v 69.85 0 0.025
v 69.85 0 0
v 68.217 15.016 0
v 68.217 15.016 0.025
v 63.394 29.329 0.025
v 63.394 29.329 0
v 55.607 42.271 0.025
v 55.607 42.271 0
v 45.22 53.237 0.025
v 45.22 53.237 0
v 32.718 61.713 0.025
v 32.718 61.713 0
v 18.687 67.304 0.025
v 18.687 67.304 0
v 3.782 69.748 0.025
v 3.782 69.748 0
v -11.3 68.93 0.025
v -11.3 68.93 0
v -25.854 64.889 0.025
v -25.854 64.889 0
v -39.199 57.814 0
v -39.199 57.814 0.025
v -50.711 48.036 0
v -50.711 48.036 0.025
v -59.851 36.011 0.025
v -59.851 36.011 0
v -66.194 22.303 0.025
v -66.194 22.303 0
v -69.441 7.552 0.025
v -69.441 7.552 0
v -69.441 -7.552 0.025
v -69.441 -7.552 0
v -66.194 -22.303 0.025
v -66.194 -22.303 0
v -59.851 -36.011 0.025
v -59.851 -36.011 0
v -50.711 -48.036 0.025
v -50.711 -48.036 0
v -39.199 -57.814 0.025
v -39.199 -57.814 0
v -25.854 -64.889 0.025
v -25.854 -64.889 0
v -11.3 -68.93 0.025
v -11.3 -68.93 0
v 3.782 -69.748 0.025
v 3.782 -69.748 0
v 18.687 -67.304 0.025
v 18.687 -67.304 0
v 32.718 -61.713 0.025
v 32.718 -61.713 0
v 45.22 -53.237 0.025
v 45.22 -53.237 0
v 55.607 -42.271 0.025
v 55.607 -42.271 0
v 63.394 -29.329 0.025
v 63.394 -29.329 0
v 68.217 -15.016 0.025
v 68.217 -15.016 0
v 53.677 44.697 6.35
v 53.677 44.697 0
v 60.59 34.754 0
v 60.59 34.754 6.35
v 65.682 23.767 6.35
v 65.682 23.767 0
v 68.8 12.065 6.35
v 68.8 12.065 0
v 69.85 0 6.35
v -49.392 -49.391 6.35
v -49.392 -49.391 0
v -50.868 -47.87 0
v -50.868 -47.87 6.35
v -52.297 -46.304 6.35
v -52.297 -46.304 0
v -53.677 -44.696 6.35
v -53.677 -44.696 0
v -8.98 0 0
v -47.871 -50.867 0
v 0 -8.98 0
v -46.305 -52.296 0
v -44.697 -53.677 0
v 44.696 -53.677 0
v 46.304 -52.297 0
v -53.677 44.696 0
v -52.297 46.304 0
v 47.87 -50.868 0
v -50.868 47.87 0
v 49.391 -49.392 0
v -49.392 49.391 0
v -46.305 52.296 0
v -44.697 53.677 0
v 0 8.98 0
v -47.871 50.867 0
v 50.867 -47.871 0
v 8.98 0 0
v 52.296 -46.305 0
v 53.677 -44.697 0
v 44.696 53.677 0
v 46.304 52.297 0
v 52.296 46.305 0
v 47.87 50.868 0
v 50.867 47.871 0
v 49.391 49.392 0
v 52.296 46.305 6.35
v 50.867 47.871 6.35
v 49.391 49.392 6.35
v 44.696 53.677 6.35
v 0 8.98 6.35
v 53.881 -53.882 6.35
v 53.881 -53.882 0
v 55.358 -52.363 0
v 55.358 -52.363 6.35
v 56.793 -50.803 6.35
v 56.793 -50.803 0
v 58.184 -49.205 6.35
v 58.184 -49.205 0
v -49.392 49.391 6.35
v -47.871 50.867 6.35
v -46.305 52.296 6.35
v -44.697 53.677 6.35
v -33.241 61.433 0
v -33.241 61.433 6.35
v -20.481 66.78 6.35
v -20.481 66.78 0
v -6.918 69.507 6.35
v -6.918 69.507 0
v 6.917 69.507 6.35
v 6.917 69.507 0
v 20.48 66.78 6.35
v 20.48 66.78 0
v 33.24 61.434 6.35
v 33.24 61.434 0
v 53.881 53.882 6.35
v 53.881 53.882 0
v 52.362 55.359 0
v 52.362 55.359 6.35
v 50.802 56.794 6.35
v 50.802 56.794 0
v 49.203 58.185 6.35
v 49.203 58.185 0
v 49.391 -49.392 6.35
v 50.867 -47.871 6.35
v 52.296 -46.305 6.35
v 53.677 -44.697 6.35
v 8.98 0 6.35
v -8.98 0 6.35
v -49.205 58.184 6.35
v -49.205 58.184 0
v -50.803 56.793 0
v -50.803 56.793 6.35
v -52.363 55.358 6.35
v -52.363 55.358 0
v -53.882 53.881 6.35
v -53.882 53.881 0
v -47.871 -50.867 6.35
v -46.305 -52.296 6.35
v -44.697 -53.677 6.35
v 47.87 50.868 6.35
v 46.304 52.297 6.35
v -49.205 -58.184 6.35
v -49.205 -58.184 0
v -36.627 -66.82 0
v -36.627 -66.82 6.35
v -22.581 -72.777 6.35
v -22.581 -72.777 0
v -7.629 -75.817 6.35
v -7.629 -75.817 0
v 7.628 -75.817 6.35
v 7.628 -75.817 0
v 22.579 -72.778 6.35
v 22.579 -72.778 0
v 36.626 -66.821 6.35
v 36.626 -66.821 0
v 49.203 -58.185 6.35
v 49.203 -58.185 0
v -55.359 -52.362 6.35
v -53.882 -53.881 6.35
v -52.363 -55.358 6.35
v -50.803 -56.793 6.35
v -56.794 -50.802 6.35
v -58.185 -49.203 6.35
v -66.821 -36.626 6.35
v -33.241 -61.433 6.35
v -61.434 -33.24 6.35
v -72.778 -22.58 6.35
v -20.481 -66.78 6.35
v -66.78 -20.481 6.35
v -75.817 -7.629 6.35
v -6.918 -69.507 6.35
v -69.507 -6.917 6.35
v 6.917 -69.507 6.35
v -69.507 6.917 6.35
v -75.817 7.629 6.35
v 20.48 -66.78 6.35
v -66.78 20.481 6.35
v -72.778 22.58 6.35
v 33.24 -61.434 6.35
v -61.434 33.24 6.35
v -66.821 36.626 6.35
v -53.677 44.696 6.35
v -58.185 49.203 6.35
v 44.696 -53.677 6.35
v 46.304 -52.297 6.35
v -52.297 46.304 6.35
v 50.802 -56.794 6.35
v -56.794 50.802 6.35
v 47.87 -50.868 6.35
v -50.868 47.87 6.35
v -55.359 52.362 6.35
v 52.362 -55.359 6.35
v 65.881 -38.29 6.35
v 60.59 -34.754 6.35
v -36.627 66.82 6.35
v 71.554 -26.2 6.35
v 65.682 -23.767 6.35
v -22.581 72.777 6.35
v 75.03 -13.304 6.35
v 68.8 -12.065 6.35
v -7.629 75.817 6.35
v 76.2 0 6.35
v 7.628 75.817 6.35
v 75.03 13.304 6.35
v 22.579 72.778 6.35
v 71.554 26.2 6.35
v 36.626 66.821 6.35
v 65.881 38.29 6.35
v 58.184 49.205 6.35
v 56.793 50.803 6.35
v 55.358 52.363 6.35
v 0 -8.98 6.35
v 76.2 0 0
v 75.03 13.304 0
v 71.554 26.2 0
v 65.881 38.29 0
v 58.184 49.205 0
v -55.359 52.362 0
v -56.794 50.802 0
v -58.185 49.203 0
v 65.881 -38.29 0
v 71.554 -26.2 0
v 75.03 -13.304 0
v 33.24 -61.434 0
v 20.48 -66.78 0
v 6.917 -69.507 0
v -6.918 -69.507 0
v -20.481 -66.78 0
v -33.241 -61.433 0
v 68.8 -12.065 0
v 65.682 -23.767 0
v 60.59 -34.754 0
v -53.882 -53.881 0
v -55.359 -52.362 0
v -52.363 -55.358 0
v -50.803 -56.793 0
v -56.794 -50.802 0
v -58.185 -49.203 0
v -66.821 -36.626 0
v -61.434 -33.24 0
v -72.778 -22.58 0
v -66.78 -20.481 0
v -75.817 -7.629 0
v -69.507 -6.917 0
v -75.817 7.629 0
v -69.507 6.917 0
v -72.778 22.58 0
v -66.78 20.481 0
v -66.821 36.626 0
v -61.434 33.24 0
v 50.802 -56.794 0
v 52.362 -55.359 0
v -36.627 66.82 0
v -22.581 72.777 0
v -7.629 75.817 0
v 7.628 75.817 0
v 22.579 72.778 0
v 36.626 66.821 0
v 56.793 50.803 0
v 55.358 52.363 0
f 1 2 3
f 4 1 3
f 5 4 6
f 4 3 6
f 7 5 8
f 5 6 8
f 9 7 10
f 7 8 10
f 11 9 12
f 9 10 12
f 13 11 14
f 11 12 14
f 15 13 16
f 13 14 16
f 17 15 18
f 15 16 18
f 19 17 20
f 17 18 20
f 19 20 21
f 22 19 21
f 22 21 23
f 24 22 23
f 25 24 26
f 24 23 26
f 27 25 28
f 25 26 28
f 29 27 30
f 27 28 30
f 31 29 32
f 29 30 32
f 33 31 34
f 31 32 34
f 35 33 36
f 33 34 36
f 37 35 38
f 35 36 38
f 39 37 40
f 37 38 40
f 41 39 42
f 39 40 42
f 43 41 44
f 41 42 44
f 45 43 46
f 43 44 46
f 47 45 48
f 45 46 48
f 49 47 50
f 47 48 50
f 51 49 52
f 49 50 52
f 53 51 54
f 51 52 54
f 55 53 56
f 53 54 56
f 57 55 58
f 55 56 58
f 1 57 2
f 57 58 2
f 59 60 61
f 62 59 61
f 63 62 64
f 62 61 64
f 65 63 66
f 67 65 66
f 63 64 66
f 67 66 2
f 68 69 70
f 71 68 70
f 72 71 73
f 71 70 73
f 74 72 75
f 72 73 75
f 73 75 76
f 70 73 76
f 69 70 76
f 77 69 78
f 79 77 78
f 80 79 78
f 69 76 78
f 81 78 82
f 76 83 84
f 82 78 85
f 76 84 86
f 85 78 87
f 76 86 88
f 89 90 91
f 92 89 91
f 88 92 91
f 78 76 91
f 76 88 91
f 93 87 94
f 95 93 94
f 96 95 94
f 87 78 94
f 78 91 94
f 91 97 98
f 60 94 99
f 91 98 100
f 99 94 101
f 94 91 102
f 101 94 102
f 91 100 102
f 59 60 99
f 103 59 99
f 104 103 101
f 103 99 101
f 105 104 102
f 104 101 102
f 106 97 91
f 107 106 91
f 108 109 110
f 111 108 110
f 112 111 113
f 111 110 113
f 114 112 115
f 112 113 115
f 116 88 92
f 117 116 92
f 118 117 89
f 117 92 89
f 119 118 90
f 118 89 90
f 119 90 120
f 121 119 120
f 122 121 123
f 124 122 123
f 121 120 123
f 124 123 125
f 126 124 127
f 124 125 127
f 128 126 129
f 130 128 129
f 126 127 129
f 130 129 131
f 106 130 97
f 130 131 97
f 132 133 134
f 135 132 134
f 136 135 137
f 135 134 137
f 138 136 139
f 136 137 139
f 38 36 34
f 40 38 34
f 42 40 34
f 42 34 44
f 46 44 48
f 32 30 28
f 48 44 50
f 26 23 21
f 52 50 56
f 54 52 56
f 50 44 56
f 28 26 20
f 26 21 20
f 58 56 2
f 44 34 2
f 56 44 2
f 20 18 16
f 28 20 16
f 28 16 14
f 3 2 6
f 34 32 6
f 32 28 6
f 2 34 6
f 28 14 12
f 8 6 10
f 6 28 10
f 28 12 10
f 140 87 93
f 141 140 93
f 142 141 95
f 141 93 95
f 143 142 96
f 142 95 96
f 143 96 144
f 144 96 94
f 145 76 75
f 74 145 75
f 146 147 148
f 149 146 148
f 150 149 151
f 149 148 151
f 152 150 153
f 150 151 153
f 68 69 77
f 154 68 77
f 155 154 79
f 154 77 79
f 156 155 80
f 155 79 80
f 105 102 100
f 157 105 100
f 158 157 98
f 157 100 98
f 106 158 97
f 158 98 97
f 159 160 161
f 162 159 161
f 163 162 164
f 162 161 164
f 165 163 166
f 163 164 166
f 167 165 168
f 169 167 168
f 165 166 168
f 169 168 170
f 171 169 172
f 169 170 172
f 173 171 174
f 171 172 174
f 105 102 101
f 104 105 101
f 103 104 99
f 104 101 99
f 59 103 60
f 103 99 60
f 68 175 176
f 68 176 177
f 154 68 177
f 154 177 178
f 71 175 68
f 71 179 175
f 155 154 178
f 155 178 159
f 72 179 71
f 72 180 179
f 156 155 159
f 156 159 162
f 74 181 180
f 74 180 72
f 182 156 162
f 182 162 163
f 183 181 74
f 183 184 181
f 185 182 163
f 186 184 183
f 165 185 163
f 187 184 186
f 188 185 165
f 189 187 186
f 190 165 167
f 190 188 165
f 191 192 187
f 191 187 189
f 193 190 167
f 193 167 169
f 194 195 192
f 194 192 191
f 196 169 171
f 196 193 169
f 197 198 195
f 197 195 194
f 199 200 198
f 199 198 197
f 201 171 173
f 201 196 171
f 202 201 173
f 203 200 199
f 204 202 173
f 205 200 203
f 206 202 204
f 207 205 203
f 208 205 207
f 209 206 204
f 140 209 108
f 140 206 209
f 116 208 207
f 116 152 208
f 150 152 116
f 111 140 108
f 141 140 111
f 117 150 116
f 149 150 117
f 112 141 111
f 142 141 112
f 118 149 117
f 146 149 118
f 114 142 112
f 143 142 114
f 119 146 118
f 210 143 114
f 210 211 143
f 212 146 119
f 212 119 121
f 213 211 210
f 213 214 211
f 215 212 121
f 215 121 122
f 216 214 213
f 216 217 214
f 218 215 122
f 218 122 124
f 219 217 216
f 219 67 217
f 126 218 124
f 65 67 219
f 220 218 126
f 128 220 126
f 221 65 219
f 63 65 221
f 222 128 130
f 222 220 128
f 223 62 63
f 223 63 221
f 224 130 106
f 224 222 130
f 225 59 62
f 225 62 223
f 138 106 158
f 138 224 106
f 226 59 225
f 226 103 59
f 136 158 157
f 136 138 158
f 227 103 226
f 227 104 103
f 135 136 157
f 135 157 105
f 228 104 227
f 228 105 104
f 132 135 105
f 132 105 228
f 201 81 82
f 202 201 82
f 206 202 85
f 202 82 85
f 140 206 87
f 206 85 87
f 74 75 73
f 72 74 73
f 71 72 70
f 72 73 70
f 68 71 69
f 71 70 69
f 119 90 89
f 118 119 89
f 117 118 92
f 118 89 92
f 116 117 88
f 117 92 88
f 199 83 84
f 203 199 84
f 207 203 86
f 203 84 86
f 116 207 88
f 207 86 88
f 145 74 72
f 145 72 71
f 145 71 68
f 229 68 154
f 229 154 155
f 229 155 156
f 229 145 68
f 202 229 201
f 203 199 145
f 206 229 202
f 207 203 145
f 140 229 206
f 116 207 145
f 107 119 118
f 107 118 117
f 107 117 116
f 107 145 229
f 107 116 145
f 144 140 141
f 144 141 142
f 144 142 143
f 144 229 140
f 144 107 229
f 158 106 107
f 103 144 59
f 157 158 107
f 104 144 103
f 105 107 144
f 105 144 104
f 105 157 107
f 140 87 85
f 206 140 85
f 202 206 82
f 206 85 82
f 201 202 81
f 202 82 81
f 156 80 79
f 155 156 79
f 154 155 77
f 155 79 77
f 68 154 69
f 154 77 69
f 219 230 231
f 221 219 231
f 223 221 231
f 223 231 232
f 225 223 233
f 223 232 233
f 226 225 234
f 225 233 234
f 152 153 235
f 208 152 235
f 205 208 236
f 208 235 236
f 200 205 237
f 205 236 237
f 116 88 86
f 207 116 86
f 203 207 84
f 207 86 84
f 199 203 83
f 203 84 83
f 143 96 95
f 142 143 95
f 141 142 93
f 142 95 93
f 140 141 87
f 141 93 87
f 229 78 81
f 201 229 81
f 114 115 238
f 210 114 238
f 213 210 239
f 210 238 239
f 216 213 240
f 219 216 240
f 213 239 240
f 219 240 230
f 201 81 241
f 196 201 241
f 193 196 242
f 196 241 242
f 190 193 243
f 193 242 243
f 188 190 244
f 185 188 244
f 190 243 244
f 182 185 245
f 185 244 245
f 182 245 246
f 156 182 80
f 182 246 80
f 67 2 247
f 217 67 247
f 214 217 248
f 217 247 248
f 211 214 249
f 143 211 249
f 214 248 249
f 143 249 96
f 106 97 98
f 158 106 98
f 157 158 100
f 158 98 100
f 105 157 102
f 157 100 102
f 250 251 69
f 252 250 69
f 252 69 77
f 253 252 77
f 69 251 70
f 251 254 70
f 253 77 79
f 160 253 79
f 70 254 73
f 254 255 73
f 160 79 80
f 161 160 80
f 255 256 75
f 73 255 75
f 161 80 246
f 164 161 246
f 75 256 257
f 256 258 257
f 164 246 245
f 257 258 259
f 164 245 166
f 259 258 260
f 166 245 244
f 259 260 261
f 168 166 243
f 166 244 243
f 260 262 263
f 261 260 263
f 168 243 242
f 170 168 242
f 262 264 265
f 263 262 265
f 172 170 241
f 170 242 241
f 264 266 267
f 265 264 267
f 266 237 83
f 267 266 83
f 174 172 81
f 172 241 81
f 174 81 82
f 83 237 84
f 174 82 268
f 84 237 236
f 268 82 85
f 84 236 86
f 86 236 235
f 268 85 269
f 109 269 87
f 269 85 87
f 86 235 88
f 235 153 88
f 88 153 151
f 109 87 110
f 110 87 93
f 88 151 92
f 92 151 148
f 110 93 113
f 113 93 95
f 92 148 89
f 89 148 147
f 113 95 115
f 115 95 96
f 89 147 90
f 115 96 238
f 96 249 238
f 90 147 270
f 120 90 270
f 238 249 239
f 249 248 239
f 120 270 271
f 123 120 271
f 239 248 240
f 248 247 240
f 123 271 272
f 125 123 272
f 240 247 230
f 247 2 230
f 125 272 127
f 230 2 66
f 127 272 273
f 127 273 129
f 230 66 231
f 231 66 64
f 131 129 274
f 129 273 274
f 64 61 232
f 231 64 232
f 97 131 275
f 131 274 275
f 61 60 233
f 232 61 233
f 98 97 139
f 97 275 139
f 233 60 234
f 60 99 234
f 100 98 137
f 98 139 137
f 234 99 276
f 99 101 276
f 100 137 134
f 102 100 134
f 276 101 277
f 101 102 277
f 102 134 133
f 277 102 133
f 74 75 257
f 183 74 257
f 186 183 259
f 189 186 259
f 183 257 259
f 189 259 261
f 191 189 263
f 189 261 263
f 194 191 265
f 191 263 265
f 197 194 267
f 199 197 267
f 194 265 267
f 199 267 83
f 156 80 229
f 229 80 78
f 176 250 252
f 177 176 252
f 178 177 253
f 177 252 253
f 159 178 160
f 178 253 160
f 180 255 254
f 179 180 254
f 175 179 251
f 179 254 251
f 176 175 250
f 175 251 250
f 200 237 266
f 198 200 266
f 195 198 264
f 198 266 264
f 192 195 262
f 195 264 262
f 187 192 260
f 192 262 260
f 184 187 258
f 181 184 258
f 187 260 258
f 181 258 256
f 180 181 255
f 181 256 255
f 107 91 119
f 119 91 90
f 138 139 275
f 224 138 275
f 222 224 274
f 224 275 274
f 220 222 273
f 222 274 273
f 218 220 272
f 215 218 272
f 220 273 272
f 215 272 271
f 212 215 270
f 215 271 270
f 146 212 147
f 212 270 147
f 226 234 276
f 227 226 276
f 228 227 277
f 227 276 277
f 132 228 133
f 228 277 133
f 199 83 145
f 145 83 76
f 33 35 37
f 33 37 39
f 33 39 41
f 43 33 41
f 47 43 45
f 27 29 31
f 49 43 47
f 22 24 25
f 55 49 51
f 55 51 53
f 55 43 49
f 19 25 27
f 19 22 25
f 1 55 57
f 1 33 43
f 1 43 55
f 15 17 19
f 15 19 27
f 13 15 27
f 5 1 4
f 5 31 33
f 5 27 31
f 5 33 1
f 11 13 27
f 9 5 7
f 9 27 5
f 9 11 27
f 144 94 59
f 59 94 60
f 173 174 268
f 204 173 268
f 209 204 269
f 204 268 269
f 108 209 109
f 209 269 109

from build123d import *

# Parameters (mm, degrees)
F1_DEPTH = 6.35
F2_DEPTH = 6.35
F3_R     = 69.85
F4_DEPTH = 0.0254


with BuildPart() as f1:
    # F0 (on Top) → F1 (new body)
    with BuildSketch(Plane.XY):
        with BuildLine():
            Line((4.4900874473, 4.4901686749), (49.390961912, 49.3918554157))
            ThreePointArc((49.390961912, 49.3918554157), (47.092393774, 51.5880698285), (44.6962749187, 53.6774208433))
            Line((44.6962749187, 53.6774208433), (-8.12276e-05, 8.9802561207))
            Line((-8.12276e-05, 8.9802561207), (-44.6972459502, 53.676612267))
            ThreePointArc((-44.6972459502, 53.676612267), (-47.0933270082, 51.5872179062), (-49.3918554157, 49.390961912))
            Line((-49.3918554157, 49.390961912), (-4.4901686749, 4.4900874473))
            Line((-4.4901686749, 4.4900874473), (8.12276e-05, 8.9802561207))
            Line((8.12276e-05, 8.9802561207), (4.4900874473, 4.4901686749))
        make_face()
        with BuildLine():
            Line((-4.4901686749, 4.4900874473), (-49.3918554157, 49.390961912))
            ThreePointArc((-49.3918554157, 49.390961912), (-51.5880698285, 47.092393774), (-53.6774208433, 44.6962749187))
            Line((-53.6774208433, 44.6962749187), (-8.9803373498, 0))
            Line((-8.9803373498, 0), (-4.4901686749, 4.4900874473))
        make_face()
        with BuildLine():
            Line((-49.3918554157, -49.390961912), (-4.4901686749, -4.4900874473))
            Line((-4.4901686749, -4.4900874473), (-8.9803373498, 0))
            Line((-8.9803373498, 0), (-53.6774208433, -44.6962749187))
            ThreePointArc((-53.6774208433, -44.6962749187), (-51.5880698285, -47.092393774), (-49.3918554157, -49.390961912))
        make_face()
        with BuildLine():
            ThreePointArc((44.6962749187, -53.6774208433), (47.092393774, -51.5880698285), (49.390961912, -49.3918554157))
            Line((49.390961912, -49.3918554157), (4.4900874473, -4.4901686749))
            Line((4.4900874473, -4.4901686749), (8.12276e-05, -8.9802561207))
            Line((8.12276e-05, -8.9802561207), (-4.4901686749, -4.4900874473))
            Line((-4.4901686749, -4.4900874473), (-49.3918554157, -49.390961912))
            ThreePointArc((-49.3918554157, -49.390961912), (-47.0933270082, -51.5872179062), (-44.6972459502, -53.676612267))
            Line((-44.6972459502, -53.676612267), (-8.12276e-05, -8.9802561207))
            Line((-8.12276e-05, -8.9802561207), (44.6962749187, -53.6774208433))
        make_face()
        Polygon((8.12276e-05, -8.9802561207), (4.4900874473, -4.4901686749), (0, 0), (-4.4901686749, -4.4900874473), align=None)
        Polygon((-4.4901686749, -4.4900874473), (0, 0), (-4.4901686749, 4.4900874473), (-8.9803373498, 0), align=None)
        Polygon((0, 0), (4.4900874473, 4.4901686749), (8.12276e-05, 8.9802561207), (-4.4901686749, 4.4900874473), align=None)
        Polygon((4.4900874473, -4.4901686749), (8.9801748946, 0), (4.4900874473, 4.4901686749), (0, 0), align=None)
        with BuildLine():
            ThreePointArc((49.390961912, -49.3918554157), (51.5872179062, -47.0933270082), (53.676612267, -44.6972459502))
            Line((53.676612267, -44.6972459502), (8.9801748946, 0))
            Line((8.9801748946, 0), (4.4900874473, -4.4901686749))
            Line((4.4900874473, -4.4901686749), (49.390961912, -49.3918554157))
        make_face()
        with BuildLine():
            Line((8.9801748946, 0), (53.676612267, 44.6972459502))
            ThreePointArc((53.676612267, 44.6972459502), (51.5872179062, 47.0933270082), (49.390961912, 49.3918554157))
            Line((49.390961912, 49.3918554157), (4.4900874473, 4.4901686749))
            Line((4.4900874473, 4.4901686749), (8.9801748946, 0))
        make_face()
    extrude(amount=F1_DEPTH)


with BuildPart() as f2:
    # F0 (on Top) → F2 (new body)
    with BuildSketch(Plane.XY):
        with BuildLine():
            ThreePointArc((58.1838051193, -49.2045203395), (71.5543358228, -26.1995615413), (76.2, 0))
            ThreePointArc((76.2, 0), (71.5543358228, 26.1995615413), (58.1838051193, 49.2045203395))
            Line((58.1838051193, 49.2045203395), (53.676612267, 44.6972459502))
            ThreePointArc((53.676612267, 44.6972459502), (65.6823182708, 23.7666902739), (69.85, 0))
            ThreePointArc((69.85, 0), (65.6823182708, -23.7666902739), (53.676612267, -44.6972459502))
            Line((53.676612267, -44.6972459502), (58.1838051193, -49.2045203395))
        make_face()
        with BuildLine():
            Line((53.676612267, 44.6972459502), (58.1838051193, 49.2045203395))
            ThreePointArc((58.1838051193, 49.2045203395), (56.0812148818, 51.5881511336), (53.8810493586, 53.8820240899))
            Line((53.8810493586, 53.8820240899), (49.390961912, 49.3918554157))
            ThreePointArc((49.390961912, 49.3918554157), (51.5872179062, 47.0933270082), (53.676612267, 44.6972459502))
        make_face()
        with BuildLine():
            ThreePointArc((53.8810493586, -53.8820240899), (56.0812148818, -51.5881511336), (58.1838051193, -49.2045203395))
            Line((58.1838051193, -49.2045203395), (53.676612267, -44.6972459502))
            ThreePointArc((53.676612267, -44.6972459502), (51.5872179062, -47.0933270082), (49.390961912, -49.3918554157))
            Line((49.390961912, -49.3918554157), (53.8810493586, -53.8820240899))
        make_face()
        with BuildLine():
            Line((49.390961912, 49.3918554157), (53.8810493586, 53.8820240899))
            ThreePointArc((53.8810493586, 53.8820240899), (51.5871366011, 56.082148116), (49.203467771, 58.1846952326))
            Line((49.203467771, 58.1846952326), (44.6962749187, 53.6774208433))
            ThreePointArc((44.6962749187, 53.6774208433), (47.092393774, 51.5880698285), (49.390961912, 49.3918554157))
        make_face()
        with BuildLine():
            ThreePointArc((49.203467771, -58.1846952326), (51.5871366011, -56.082148116), (53.8810493586, -53.8820240899))
            Line((53.8810493586, -53.8820240899), (49.390961912, -49.3918554157))
            ThreePointArc((49.390961912, -49.3918554157), (47.092393774, -51.5880698285), (44.6962749187, -53.6774208433))
            Line((44.6962749187, -53.6774208433), (49.203467771, -58.1846952326))
        make_face()
        with BuildLine():
            Line((44.6962749187, 53.6774208433), (49.203467771, 58.1846952326))
            ThreePointArc((49.203467771, 58.1846952326), (-0.0006892391, 76.1999999969), (-49.2045203395, 58.1838051193))
            Line((-49.2045203395, 58.1838051193), (-44.6972459502, 53.676612267))
            ThreePointArc((-44.6972459502, 53.676612267), (-0.0006318025, 69.8499999971), (44.6962749187, 53.6774208433))
        make_face()
        with BuildLine():
            ThreePointArc((-49.2045203395, -58.1838051193), (-0.0006892391, -76.1999999969), (49.203467771, -58.1846952326))
            Line((49.203467771, -58.1846952326), (44.6962749187, -53.6774208433))
            ThreePointArc((44.6962749187, -53.6774208433), (-0.0006318025, -69.8499999971), (-44.6972459502, -53.676612267))
            Line((-44.6972459502, -53.676612267), (-49.2045203395, -58.1838051193))
        make_face()
        with BuildLine():
            Line((-44.6972459502, 53.676612267), (-49.2045203395, 58.1838051193))
            ThreePointArc((-49.2045203395, 58.1838051193), (-51.5881511336, 56.0812148818), (-53.8820240899, 53.8810493586))
            Line((-53.8820240899, 53.8810493586), (-49.3918554157, 49.390961912))
            ThreePointArc((-49.3918554157, 49.390961912), (-47.0933270082, 51.5872179062), (-44.6972459502, 53.676612267))
        make_face()
        with BuildLine():
            ThreePointArc((-53.8820240899, -53.8810493586), (-51.5881511336, -56.0812148818), (-49.2045203395, -58.1838051193))
            Line((-49.2045203395, -58.1838051193), (-44.6972459502, -53.676612267))
            ThreePointArc((-44.6972459502, -53.676612267), (-47.0933270082, -51.5872179062), (-49.3918554157, -49.390961912))
            Line((-49.3918554157, -49.390961912), (-53.8820240899, -53.8810493586))
        make_face()
        with BuildLine():
            Line((-49.3918554157, 49.390961912), (-53.8820240899, 53.8810493586))
            ThreePointArc((-53.8820240899, 53.8810493586), (-56.082148116, 51.5871366011), (-58.1846952326, 49.203467771))
            Line((-58.1846952326, 49.203467771), (-53.6774208433, 44.6962749187))
            ThreePointArc((-53.6774208433, 44.6962749187), (-51.5880698285, 47.092393774), (-49.3918554157, 49.390961912))
        make_face()
        with BuildLine():
            ThreePointArc((-58.1846952326, -49.203467771), (-56.082148116, -51.5871366011), (-53.8820240899, -53.8810493586))
            Line((-53.8820240899, -53.8810493586), (-49.3918554157, -49.390961912))
            ThreePointArc((-49.3918554157, -49.390961912), (-51.5880698285, -47.092393774), (-53.6774208433, -44.6962749187))
            Line((-53.6774208433, -44.6962749187), (-58.1846952326, -49.203467771))
        make_face()
        with BuildLine():
            Line((-53.6774208433, 44.6962749187), (-58.1846952326, 49.203467771))
            ThreePointArc((-58.1846952326, 49.203467771), (-76.2, 0), (-58.1846952326, -49.203467771))
            Line((-58.1846952326, -49.203467771), (-53.6774208433, -44.6962749187))
            ThreePointArc((-53.6774208433, -44.6962749187), (-69.85, 0), (-53.6774208433, 44.6962749187))
        make_face()
    extrude(amount=F2_DEPTH)


with BuildPart() as f4:
    # F3 (on Top) → F4 (new body)
    with BuildSketch(Plane.XY):
        Circle(F3_R)
    extrude(amount=F4_DEPTH)


solid = Compound([f1.part, f2.part, f4.part])
